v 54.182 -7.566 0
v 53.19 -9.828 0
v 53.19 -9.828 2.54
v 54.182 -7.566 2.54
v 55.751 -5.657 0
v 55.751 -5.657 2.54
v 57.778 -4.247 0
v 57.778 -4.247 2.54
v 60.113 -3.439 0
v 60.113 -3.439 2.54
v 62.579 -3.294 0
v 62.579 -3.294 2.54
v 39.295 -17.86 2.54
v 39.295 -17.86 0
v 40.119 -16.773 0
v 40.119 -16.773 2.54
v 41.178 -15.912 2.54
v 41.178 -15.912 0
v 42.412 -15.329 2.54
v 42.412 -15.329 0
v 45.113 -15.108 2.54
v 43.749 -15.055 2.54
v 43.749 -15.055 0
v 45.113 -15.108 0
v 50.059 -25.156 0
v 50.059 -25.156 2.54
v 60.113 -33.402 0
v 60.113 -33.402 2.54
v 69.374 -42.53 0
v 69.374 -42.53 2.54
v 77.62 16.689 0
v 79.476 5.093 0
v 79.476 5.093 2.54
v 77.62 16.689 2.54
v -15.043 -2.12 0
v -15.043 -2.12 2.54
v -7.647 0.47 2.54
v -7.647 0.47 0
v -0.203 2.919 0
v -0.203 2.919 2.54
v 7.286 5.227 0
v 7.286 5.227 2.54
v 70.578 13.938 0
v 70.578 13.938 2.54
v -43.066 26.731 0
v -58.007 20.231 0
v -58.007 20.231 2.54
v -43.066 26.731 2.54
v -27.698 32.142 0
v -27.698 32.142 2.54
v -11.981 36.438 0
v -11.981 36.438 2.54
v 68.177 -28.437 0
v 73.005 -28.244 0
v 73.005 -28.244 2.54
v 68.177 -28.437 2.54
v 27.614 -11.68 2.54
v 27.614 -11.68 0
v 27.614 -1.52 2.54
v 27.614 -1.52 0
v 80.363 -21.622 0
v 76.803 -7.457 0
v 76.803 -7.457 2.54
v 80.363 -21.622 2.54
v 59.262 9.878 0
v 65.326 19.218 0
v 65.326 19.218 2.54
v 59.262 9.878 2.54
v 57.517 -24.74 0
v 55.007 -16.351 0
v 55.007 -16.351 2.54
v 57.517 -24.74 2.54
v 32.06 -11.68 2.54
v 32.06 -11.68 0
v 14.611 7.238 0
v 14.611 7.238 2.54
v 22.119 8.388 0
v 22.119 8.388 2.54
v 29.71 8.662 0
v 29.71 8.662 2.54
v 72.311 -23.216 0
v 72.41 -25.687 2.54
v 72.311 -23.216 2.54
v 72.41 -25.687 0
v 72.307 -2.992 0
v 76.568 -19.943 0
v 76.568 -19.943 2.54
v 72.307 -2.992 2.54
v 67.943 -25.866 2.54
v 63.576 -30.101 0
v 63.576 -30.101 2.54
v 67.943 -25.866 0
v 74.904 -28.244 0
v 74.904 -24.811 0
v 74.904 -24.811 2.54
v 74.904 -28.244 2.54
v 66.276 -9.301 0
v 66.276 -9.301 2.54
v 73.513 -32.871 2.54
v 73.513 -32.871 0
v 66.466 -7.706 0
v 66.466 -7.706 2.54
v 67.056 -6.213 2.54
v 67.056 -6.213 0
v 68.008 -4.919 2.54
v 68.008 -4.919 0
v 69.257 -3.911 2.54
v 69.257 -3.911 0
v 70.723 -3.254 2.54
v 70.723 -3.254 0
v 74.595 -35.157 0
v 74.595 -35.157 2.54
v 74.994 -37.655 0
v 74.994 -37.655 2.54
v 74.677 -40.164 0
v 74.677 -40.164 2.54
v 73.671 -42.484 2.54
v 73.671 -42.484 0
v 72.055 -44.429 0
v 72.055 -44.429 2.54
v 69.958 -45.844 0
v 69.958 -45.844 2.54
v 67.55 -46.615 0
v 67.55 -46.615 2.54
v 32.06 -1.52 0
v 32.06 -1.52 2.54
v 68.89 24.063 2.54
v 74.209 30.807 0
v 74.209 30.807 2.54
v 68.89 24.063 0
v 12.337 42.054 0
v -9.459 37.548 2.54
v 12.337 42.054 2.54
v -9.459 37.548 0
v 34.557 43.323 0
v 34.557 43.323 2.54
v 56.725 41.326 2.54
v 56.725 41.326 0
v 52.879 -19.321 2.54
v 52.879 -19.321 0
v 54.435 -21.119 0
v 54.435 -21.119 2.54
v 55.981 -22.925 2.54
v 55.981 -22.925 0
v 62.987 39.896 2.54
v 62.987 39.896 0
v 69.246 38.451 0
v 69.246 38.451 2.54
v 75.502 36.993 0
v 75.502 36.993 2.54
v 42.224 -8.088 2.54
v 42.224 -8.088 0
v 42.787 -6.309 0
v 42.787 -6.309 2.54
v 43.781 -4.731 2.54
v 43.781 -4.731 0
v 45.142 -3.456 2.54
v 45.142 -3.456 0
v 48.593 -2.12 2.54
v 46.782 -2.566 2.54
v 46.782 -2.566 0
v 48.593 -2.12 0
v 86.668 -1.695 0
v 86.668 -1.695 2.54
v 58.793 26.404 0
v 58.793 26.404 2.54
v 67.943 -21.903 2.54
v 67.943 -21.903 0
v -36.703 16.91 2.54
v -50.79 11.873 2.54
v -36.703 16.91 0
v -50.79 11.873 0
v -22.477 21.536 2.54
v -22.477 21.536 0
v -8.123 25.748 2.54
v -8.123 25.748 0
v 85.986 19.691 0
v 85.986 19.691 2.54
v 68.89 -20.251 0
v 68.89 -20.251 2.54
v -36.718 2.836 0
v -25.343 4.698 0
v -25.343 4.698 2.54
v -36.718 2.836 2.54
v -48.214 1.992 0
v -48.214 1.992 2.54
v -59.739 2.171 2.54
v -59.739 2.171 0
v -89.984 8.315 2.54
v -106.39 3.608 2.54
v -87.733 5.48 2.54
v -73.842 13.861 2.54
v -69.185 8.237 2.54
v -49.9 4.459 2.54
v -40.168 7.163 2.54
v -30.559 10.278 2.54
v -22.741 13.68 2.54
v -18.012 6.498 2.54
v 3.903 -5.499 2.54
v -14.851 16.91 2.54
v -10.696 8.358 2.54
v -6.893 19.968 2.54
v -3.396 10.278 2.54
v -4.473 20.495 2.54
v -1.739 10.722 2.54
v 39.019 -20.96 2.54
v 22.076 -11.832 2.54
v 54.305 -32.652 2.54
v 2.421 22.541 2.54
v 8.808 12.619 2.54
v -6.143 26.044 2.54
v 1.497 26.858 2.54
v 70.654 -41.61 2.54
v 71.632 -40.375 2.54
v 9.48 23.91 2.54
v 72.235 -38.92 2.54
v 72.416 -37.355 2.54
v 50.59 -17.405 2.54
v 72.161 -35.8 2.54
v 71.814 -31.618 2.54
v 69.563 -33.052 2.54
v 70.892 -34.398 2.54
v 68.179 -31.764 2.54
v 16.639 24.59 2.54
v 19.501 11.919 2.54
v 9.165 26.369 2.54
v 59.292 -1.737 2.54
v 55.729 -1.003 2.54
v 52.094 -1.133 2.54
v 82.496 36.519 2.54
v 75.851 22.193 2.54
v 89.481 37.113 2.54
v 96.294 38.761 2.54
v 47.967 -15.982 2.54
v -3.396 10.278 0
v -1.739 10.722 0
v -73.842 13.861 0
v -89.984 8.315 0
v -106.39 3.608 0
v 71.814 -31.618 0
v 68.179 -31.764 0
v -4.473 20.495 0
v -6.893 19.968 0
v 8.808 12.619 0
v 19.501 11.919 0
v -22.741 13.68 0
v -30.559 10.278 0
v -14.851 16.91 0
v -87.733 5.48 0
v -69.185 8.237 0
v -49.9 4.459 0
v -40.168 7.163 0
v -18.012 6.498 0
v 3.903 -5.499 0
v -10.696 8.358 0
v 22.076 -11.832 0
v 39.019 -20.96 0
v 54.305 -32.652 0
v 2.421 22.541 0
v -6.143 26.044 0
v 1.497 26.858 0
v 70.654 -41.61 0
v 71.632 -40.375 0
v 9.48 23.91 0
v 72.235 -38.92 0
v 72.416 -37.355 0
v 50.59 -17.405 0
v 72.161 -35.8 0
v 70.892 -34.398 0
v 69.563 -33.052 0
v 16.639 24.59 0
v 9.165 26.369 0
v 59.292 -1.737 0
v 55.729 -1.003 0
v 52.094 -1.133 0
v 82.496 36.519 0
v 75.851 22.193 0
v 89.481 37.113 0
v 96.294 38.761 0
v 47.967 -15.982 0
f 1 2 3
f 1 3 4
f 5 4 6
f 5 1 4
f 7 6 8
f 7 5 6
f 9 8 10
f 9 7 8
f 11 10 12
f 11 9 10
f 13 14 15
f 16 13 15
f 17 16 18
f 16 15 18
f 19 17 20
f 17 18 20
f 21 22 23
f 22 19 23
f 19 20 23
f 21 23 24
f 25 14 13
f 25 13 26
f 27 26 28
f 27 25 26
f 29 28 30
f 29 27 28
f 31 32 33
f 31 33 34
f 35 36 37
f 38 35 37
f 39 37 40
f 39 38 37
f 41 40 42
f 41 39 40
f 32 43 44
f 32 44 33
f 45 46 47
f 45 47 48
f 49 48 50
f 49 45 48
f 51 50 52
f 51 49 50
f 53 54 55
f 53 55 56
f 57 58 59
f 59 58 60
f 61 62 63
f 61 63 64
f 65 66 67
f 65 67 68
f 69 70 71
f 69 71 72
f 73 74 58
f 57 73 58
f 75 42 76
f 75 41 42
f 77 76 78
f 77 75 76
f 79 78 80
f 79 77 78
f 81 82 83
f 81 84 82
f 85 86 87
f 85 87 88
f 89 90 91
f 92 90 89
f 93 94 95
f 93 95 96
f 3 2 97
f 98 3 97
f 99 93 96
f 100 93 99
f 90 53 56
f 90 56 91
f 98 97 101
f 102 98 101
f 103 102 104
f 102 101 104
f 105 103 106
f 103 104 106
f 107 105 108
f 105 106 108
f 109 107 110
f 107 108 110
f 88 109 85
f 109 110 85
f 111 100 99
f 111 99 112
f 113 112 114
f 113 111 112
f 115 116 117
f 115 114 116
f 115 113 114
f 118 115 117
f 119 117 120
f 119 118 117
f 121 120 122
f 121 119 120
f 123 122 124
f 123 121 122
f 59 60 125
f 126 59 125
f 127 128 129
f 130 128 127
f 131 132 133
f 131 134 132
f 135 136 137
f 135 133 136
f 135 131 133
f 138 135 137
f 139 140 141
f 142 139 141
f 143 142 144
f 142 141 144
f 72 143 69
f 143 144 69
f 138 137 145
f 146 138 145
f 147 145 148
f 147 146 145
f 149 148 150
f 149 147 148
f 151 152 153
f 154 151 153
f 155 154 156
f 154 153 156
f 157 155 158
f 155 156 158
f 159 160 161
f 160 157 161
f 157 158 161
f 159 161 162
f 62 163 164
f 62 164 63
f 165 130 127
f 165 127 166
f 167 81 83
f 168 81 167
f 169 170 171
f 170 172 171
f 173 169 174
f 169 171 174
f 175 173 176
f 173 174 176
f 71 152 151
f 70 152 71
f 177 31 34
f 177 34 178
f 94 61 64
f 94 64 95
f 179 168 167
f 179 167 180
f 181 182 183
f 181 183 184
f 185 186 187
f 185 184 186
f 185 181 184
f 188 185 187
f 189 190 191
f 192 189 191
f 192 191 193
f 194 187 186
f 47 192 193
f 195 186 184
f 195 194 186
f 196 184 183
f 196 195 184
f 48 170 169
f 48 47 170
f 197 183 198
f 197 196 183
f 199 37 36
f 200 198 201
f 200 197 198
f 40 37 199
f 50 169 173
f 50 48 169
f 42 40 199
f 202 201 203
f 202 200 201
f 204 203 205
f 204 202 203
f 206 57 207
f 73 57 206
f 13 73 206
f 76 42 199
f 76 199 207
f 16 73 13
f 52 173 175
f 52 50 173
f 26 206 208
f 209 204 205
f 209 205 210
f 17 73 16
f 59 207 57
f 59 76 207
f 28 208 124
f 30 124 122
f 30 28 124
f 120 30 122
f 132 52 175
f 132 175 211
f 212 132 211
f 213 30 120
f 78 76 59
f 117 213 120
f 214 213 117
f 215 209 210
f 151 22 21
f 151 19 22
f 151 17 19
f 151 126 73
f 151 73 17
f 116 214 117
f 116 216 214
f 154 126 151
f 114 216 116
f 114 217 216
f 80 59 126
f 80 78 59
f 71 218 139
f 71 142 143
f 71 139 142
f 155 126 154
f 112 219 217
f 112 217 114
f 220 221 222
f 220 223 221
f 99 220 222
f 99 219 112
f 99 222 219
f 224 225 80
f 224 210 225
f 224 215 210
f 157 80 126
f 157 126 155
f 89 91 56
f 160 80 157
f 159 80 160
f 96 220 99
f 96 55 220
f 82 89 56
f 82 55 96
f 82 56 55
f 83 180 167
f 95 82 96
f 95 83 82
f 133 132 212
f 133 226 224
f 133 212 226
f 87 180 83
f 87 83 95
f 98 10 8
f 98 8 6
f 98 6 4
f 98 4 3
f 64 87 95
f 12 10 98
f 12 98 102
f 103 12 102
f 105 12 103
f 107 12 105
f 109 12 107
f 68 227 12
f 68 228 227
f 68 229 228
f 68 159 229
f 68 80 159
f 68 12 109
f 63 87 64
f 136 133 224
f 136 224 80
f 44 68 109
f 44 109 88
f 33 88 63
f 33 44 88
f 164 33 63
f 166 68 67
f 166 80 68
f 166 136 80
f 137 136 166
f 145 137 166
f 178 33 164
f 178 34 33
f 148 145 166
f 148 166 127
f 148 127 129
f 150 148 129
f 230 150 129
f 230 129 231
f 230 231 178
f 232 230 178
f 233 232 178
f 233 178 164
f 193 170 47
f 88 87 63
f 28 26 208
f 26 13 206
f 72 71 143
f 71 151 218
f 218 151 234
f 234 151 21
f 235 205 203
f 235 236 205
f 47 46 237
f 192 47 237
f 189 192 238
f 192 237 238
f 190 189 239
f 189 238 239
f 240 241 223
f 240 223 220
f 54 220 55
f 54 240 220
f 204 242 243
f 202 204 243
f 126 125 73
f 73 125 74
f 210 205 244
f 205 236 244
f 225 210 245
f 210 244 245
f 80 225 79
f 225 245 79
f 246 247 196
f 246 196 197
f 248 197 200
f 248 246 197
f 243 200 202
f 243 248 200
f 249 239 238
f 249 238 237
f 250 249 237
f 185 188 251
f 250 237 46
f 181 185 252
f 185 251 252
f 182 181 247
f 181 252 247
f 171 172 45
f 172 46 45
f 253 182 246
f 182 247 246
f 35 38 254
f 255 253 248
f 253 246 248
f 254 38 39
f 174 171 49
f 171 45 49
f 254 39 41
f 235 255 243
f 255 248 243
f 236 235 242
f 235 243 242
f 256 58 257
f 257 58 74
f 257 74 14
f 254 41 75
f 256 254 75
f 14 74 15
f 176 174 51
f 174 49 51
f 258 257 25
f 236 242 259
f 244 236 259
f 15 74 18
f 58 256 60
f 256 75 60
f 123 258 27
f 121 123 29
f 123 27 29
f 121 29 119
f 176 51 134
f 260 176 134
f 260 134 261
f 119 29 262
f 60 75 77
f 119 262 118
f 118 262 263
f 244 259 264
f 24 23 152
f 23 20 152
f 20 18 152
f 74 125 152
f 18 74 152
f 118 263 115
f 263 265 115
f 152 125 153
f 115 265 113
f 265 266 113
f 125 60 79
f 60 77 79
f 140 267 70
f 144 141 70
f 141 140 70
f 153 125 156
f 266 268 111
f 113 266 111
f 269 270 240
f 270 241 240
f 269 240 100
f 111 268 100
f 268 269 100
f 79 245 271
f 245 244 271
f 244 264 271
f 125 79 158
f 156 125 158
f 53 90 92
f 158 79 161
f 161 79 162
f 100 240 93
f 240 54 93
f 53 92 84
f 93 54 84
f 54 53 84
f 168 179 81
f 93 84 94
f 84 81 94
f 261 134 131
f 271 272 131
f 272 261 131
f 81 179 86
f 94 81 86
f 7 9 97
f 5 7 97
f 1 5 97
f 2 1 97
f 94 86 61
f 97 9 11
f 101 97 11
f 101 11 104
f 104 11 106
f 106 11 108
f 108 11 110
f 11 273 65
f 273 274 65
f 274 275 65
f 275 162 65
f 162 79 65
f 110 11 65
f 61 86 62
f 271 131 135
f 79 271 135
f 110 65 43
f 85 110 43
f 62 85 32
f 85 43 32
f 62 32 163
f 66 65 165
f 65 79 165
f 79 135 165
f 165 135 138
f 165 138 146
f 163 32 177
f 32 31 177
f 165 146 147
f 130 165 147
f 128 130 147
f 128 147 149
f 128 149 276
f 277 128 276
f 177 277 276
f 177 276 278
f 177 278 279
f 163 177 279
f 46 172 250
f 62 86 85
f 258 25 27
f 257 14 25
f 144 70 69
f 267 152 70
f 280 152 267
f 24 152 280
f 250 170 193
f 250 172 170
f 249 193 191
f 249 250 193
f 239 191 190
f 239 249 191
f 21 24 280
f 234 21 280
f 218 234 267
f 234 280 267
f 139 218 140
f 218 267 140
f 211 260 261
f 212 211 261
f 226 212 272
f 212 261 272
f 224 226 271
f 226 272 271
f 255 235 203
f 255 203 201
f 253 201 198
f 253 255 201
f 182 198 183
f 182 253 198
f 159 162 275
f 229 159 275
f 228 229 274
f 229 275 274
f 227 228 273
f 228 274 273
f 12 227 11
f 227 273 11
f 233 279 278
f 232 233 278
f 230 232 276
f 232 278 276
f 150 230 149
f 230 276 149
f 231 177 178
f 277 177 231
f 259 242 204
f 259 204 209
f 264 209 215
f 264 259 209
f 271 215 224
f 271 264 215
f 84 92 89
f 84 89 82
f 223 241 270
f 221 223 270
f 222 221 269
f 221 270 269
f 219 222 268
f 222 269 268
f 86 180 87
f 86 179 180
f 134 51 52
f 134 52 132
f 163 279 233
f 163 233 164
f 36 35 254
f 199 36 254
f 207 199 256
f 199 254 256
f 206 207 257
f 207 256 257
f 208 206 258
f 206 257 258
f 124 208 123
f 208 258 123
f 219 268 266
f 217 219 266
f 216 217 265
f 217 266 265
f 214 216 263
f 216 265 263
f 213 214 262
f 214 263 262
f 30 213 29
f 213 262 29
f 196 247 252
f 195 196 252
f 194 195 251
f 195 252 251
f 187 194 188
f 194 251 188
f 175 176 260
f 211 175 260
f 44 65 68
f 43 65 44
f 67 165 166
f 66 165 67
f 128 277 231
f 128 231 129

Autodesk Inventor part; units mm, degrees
ref_plane "YZ Plane" through (0, 0, 0) normal (1, 0, 0) x (0, 1, 0)
ref_plane "XZ Plane" through (0, 0, 0) normal (0, 1, 0) x (-1, 0, 0)
ref_plane "XY Plane" through (0, 0, 0) normal (0, 0, 1) x (1, 0, 0)
sketch "Sketch1" plane through (0, 0, 0) normal (0, 0, 1) x (1, 0, 0)
  line L0 (-121.92, 53.34) -> (121.92, 53.34)
  line L1 (121.92, 53.34) -> (121.92, -53.34)
  line L2 (121.92, -53.34) -> (-121.92, -53.34)
  line L3 (-121.92, -53.34) -> (-121.92, 53.34)
  line L4 (-121.92, 53.34) -> (121.92, -53.34) construction
  line L5 (121.92, 53.34) -> (-121.92, -53.34) construction
  arc A0 (67.5496, -52.2242) -> (-16.5252, -5.911) centre (-36.2594, -141.2049) ccw
  arc A1 (67.5496, -52.2242) -> (78.4495, -31.764) centre (64.7451, -37.5966) ccw
  arc A2 (-20.2647, 1.2126) -> (-16.5252, -5.911) centre (-17.1494, -1.6953) ccw
  arc A3 (-43.7287, -2.3938) -> (-20.2647, 1.2126) centre (-53.1153, 136.8126) ccw
  arc A4 (-61.5471, -2.0063) -> (-43.7287, -2.3938) centre (-51.0941, 68.8006) ccw
  arc A5 (-65.9278, 3.1159) -> (-61.5471, -2.0063) centre (-61.6241, 2.3622) ccw
  arc A6 (-108.1597, -0.5066) -> (-65.9278, 3.1159) centre (-96.2599, 108.7489) ccw
  arc A7 (-109.606, 7.2871) -> (-108.1597, -0.5066) centre (-107.7116, 3.6077) ccw
  arc A8 (-109.606, 7.2871) -> (-29.7712, 36.4682) centre (-485.0256, 1158.173) ccw
  arc A9 (46.8022, 47.5707) -> (-29.7712, 36.4682) centre (33.6127, -131.0759) ccw
  arc A10 (75.8647, 41.5807) -> (46.8022, 47.5707) centre (24.6007, -133.6461) ccw
  arc A11 (75.8647, 41.5807) -> (97.0333, 43.8681) centre (82.7984, 76.5092) ccw
  arc A12 (101.3733, 39.6116) -> (97.0333, 43.8681) centre (98.7975, 41.3261) ccw
  line L6 (101.3733, 39.6116) -> (91.2149, -4.1951)
  line L7 (91.2149, -4.1951) -> (82.1219, -9.828)
  line L8 (82.1219, -9.828) -> (85.6883, -23.6524)
  line L9 (85.6883, -23.6524) -> (79.8094, -27.2942)
  line L10 (79.8094, -27.2942) -> (78.4495, -31.764)
  arc A13 (-8.123, 25.7478) -> (-50.7898, 11.8734) centre (130.1222, -471.929) ccw
  arc A14 (-59.7387, 2.1709) -> (-25.343, 4.6976) centre (-51.96, 131.6592) ccw
  arc A15 (-25.343, 4.6976) -> (-3.3955, 10.2777) centre (-241.5674, 901.0891) ccw
  arc A16 (-59.7387, 2.1709) -> (-30.5588, 10.2777) centre (-108.6142, 234.6643) ccw
  arc A17 (-6.8927, 19.9675) -> (-30.5588, 10.2777) centre (128.911, -345.4626) ccw
  arc A18 (29.71, 8.6625) -> (7.2861, 5.2273) centre (28.2796, -56.9055) ccw
  arc A19 (67.5496, -46.6147) -> (-15.043, -2.1204) centre (-26.7986, -122.8453) ccw
  arc A20 (7.2861, 5.2273) -> (-15.043, -2.1204) centre (125.1778, -390.6373) ccw
  arc A21 (29.71, 8.6625) -> (-1.7387, 10.7223) centre (11.2905, -31.4567) ccw
  arc A22 (16.6394, 24.5902) -> (-4.4734, 20.4951) centre (20.0682, -49.5605) ccw
  arc A23 (16.6394, 24.5902) -> (-6.1428, 26.0437) centre (2.4584, -18.4113) ccw
  line L11 (-4.4734, 20.4951) -> (-6.8927, 19.9675)
  line L12 (-1.7387, 10.7223) -> (-3.3955, 10.2777)
  line L13 (-8.123, 25.7478) -> (-6.1428, 26.0437)
  line L14 (-11.9813, 36.4379) -> (-9.4594, 37.5475)
  arc A24 (56.7247, 41.3261) -> (-9.4594, 37.5475) centre (32.0703, -108.3526) ccw
  arc A25 (75.5018, 36.9927) -> (96.2941, 38.7613) centre (82.101, 82.5143) ccw
  arc A26 (75.5018, 36.9927) -> (56.7247, 41.3261) centre (-574.7188, -2737.6346) ccw
  arc A27 (48.5931, -2.1204) -> (42.2239, -8.0879) centre (49.4213, -9.3871) ccw
  arc A28 (62.5792, -3.2945) -> (48.5931, -2.1204) centre (54.4536, -16.199) ccw
  arc A29 (62.5792, -3.2945) -> (53.1895, -9.828) centre (61.8675, -12.2858) ccw
  arc A30 (72.3073, -2.9923) -> (66.2757, -9.3006) centre (72.5246, -9.2377) ccw
  arc A31 (45.1126, -15.108) -> (39.2947, -17.8603) centre (44.2132, -20.7321) ccw
  arc A32 (52.8788, -19.3209) -> (45.1126, -15.108) centre (42.182, -29.7749) ccw
  arc A33 (57.5173, -24.7402) -> (52.8788, -19.3209) centre (-276.2295, -305.7101) ccw
  arc A34 (69.3744, -42.5298) -> (72.1611, -35.7997) centre (66.7227, -37.4899) ccw
  arc A35 (67.5496, -46.6147) -> (73.5131, -32.8714) centre (66.056, -37.8011) ccw
  arc A36 (72.1611, -35.7997) -> (68.1792, -31.764) centre (38.6776, -64.8546) ccw
  arc A37 (69.3744, -42.5298) -> (39.2947, -17.8603) centre (-35.2417, -139.4161) ccw
  line L15 (96.2941, 38.7613) -> (86.6684, -1.6953)
  line L16 (86.6684, -1.6953) -> (76.8032, -7.4567)
  line L17 (76.8032, -7.4567) -> (80.3634, -21.6224)
  line L18 (80.3634, -21.6224) -> (74.9042, -24.8106)
  line L19 (74.9042, -24.8106) -> (74.9042, -28.2436)
  line L20 (74.9042, -28.2436) -> (73.5131, -32.8714)
  line L21 (68.1792, -31.764) -> (71.8142, -31.6183)
  line L22 (71.8142, -31.6183) -> (73.0053, -28.2436)
  line L23 (73.0053, -28.2436) -> (68.1773, -28.4371)
  line L24 (68.1773, -28.4371) -> (63.5764, -30.1012)
  line L25 (63.5764, -30.1012) -> (67.9428, -25.8659)
  line L26 (67.9428, -25.8659) -> (72.4098, -25.6869)
  line L27 (72.4098, -25.6869) -> (72.3107, -23.2165)
  line L28 (72.3107, -23.2165) -> (67.9428, -21.9034)
  line L29 (67.9428, -21.9034) -> (68.8903, -20.251)
  line L30 (68.8903, -20.251) -> (76.5676, -19.9433)
  line L31 (76.5676, -19.9433) -> (72.3073, -2.9923)
  arc A38 (-106.3904, 3.6077) -> (-58.0071, 20.2313) centre (-189.4647, 324.1182) ccw
  arc A39 (-11.9813, 36.4379) -> (-58.0071, 20.2313) centre (40.006, -184.6624) ccw
  line L32 (65.3263, 19.2184) -> (59.2622, 9.8782)
  line L33 (59.2622, 9.8782) -> (70.5776, 13.9377)
  line L34 (70.5776, 13.9377) -> (79.476, 5.0926)
  line L35 (79.476, 5.0926) -> (77.62, 16.6894)
  line L36 (77.62, 16.6894) -> (85.9858, 19.6907)
  line L37 (85.9858, 19.6907) -> (75.851, 22.1929)
  line L38 (75.851, 22.1929) -> (74.2086, 30.8072)
  line L39 (74.2086, 30.8072) -> (68.8903, 24.063)
  line L40 (68.8903, 24.063) -> (58.7931, 26.4044)
  line L41 (58.7931, 26.4044) -> (65.3263, 19.2184)
  line L42 (42.2239, -8.0879) -> (55.0071, -16.3511)
  line L43 (55.0071, -16.3511) -> (57.5173, -24.7402)
  line L44 (53.1895, -9.828) -> (66.2757, -9.3006)
  arc A40 (-106.3904, 3.6077) -> (-50.7898, 11.8734) centre (-136.4008, 396.611) ccw
  line L45 (27.6145, -1.5196) -> (32.0595, -1.5196)
  line L46 (32.0595, -1.5196) -> (32.0595, -11.6796)
  line L47 (32.0595, -11.6796) -> (27.6145, -11.6796)
  line L48 (27.6145, -11.6796) -> (27.6145, -1.5196)
  line L49 (27.6145, -1.5196) -> (32.0595, -11.6796) construction
  line L50 (32.0595, -1.5196) -> (27.6145, -11.6796) construction
  point P0 (0, 0)
  point P1 (29.837, -6.5996)
  dimension "d0" = 243.84
  dimension "d1" = 106.68
  dimension "d21" = 4.445
  dimension "d22" = 10.16
extrude "Extrusion2" add sketch "Sketch1" along normal blind 2.54 contours A13 A40 A38 A39 L14 A24 A26 A25 L15 L16 L17 L18 L19 L20 A35 A19 A20 A18 A21 L12 A15 A14 A16 A17 L11 A22 A23 L13
properties part number "RTS patriots"
